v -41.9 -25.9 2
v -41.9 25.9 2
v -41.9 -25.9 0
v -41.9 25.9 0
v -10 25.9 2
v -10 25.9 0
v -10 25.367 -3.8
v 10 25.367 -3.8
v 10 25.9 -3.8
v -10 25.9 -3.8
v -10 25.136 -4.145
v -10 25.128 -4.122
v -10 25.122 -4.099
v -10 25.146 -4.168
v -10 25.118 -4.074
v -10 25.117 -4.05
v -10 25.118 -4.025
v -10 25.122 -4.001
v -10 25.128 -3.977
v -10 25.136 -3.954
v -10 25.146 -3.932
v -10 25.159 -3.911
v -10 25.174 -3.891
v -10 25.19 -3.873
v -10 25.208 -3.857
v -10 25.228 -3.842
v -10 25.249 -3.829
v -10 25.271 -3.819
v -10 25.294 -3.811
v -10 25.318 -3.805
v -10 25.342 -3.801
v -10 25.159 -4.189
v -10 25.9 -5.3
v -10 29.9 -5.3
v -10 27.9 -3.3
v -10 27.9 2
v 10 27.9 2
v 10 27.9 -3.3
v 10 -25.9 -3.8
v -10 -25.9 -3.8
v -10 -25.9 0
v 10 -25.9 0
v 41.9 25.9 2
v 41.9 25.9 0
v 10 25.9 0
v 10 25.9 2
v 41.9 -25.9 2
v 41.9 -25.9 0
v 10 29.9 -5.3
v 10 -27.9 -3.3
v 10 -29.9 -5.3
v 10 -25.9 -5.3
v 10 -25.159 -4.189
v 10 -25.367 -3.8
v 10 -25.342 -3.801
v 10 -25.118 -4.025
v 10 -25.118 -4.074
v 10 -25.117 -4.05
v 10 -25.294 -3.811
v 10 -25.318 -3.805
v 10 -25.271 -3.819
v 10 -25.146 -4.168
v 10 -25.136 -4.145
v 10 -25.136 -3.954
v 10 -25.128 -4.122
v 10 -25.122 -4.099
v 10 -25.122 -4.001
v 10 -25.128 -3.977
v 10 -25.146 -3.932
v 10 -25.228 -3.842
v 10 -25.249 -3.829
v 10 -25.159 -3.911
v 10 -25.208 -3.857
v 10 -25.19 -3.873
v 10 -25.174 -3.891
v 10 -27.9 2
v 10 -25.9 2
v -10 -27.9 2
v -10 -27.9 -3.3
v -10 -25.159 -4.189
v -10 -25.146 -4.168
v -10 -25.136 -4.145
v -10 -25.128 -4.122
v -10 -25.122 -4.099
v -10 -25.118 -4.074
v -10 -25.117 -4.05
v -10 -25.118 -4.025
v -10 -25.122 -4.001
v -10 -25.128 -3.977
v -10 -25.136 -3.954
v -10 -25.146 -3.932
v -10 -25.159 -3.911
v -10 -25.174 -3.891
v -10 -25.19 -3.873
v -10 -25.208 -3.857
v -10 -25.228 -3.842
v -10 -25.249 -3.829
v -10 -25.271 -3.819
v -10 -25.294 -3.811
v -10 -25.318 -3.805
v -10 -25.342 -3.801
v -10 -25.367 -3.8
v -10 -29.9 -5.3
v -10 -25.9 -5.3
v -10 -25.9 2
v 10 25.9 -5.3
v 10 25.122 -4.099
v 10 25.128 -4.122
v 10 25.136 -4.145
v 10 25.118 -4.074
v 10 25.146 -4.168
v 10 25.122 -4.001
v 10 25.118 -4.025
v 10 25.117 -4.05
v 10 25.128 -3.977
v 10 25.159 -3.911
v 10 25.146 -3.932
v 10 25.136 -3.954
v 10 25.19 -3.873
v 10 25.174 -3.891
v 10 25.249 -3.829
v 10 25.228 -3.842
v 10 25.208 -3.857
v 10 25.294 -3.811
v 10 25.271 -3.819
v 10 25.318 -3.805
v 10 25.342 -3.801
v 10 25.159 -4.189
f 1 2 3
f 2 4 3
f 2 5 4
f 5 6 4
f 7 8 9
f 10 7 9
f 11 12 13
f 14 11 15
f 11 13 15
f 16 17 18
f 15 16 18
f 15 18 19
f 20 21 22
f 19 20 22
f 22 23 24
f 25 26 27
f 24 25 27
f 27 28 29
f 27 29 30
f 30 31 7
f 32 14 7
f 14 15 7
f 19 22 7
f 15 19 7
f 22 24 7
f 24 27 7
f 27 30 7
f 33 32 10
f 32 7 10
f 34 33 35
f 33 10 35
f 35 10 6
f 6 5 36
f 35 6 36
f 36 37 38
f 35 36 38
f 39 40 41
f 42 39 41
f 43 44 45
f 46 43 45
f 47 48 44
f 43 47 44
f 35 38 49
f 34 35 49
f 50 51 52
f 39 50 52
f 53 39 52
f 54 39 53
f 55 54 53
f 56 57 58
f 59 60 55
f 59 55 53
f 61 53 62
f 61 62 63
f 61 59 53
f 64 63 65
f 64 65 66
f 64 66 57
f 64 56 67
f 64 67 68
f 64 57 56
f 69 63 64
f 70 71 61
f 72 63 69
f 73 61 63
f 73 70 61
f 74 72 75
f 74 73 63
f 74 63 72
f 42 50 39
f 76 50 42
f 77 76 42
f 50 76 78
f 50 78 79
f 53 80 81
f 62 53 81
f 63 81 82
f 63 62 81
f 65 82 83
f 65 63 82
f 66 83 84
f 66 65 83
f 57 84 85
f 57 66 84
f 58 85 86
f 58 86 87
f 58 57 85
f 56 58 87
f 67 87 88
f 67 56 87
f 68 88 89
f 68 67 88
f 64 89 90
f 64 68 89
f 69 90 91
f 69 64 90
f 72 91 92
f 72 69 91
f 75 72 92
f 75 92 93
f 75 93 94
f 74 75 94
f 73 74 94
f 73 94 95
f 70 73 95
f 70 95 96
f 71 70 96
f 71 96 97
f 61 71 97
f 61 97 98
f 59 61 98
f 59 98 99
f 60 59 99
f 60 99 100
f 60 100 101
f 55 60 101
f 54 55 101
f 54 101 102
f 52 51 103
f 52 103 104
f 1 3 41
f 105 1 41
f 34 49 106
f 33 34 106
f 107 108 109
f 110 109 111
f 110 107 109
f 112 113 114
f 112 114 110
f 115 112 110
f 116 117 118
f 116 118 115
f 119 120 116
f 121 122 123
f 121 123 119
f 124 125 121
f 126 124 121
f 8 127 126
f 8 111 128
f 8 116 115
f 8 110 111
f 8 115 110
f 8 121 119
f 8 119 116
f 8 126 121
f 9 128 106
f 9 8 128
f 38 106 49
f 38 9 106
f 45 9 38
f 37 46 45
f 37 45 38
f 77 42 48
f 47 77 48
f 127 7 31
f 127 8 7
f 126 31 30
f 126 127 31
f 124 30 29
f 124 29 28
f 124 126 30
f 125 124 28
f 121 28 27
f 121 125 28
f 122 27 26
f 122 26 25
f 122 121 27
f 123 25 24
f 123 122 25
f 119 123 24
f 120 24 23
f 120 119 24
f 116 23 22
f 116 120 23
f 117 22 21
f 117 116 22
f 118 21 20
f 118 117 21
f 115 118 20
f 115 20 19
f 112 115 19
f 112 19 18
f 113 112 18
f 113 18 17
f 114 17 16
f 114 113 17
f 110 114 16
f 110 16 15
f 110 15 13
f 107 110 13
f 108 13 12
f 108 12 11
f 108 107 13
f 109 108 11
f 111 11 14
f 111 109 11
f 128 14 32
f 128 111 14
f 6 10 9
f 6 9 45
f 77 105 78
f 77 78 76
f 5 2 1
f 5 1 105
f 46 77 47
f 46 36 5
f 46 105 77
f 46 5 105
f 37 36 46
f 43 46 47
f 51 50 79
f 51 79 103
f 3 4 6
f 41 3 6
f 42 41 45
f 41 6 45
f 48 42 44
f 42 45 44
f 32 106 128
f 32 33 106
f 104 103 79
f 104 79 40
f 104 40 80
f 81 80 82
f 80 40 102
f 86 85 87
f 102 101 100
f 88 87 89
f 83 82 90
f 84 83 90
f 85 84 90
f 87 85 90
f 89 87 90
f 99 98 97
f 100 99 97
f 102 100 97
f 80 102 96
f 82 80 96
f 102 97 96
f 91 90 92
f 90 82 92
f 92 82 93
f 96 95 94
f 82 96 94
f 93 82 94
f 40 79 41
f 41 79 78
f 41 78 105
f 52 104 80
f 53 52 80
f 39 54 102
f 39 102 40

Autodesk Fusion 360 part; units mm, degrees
sketch "Boceto1" plane through (0, 0, 0) normal (0, 0, 1) x (1, 0, 0)
  line L0 (41.9, 25.9) -> (-41.9, 25.9)
  line L1 (-41.9, 25.9) -> (-41.9, -25.9)
  line L2 (-41.9, -25.9) -> (41.9, -25.9)
  line L3 (41.9, -25.9) -> (41.9, 25.9)
  line L4 (41.9, 25.9) -> (-41.9, -25.9) construction
  line L5 (-41.9, 25.9) -> (41.9, -25.9) construction
  dimension "d1" = 83.8
  dimension "d2" = 51.8
extrude "Extruir1" add sketch "Boceto1" along normal blind 2
sketch "Boceto4" plane through (0, 0, 0) normal (1, 0, 0) x (0, 1, 0)
  line L0 (25.9, 2) -> (27.9, 2)
  line L1 (27.9, 2) -> (27.9, -5.3)
  line L2 (27.9, -5.3) -> (25.9, -5.3)
  line L3 (25.9, -5.3) -> (25.9, 2)
  line L4 (25.9, -5.3) -> (24.8996, -3.8)
  line L5 (25.9, -5.3) -> (27.703, -5.3) construction
  line L6 (24.8996, -3.8) -> (25.9, -3.8)
  line L7 (27.9, -5.3) -> (29.9, -5.3)
  line L8 (27.9, -5.3) -> (27.9, -3.3)
  line L9 (27.9, -3.3) -> (29.9, -5.3)
  line L10 (0, 7.5) -> (0, -4)
  line L11 (-25.9, -5.3) -> (-25.9, 2)
  line L12 (-25.9, 2) -> (-27.9, 2)
  line L13 (-27.9, 2) -> (-27.9, -5.3)
  line L14 (-27.9, -5.3) -> (-29.9, -5.3)
  line L15 (-27.9, -5.3) -> (-27.9, -3.3)
  line L16 (-27.9, -3.3) -> (-29.9, -5.3)
  line L17 (-24.8996, -3.8) -> (-25.9, -3.8)
  line L18 (-25.9, -5.3) -> (-24.8996, -3.8)
  line L19 (-25.9, -5.3) -> (-27.703, -5.3) construction
  line L20 (-27.9, -5.3) -> (-25.9, -5.3)
  dimension "d20" = 2
  dimension "d21" = 7.3
  dimension "d29" = 1.0004
  dimension "d30" = 1.803
  dimension "d31" = 2
  dimension "d32" = 2
extrude "Extruir5" add sketch "Boceto4" along normal mid plane 20
fillet "Empalme1" radius 0.25 2 edges at (0, 24.8996, -3.8) (0, -24.8996, -3.8)
equation "d21 = 2 mm + 5.3 mm"
